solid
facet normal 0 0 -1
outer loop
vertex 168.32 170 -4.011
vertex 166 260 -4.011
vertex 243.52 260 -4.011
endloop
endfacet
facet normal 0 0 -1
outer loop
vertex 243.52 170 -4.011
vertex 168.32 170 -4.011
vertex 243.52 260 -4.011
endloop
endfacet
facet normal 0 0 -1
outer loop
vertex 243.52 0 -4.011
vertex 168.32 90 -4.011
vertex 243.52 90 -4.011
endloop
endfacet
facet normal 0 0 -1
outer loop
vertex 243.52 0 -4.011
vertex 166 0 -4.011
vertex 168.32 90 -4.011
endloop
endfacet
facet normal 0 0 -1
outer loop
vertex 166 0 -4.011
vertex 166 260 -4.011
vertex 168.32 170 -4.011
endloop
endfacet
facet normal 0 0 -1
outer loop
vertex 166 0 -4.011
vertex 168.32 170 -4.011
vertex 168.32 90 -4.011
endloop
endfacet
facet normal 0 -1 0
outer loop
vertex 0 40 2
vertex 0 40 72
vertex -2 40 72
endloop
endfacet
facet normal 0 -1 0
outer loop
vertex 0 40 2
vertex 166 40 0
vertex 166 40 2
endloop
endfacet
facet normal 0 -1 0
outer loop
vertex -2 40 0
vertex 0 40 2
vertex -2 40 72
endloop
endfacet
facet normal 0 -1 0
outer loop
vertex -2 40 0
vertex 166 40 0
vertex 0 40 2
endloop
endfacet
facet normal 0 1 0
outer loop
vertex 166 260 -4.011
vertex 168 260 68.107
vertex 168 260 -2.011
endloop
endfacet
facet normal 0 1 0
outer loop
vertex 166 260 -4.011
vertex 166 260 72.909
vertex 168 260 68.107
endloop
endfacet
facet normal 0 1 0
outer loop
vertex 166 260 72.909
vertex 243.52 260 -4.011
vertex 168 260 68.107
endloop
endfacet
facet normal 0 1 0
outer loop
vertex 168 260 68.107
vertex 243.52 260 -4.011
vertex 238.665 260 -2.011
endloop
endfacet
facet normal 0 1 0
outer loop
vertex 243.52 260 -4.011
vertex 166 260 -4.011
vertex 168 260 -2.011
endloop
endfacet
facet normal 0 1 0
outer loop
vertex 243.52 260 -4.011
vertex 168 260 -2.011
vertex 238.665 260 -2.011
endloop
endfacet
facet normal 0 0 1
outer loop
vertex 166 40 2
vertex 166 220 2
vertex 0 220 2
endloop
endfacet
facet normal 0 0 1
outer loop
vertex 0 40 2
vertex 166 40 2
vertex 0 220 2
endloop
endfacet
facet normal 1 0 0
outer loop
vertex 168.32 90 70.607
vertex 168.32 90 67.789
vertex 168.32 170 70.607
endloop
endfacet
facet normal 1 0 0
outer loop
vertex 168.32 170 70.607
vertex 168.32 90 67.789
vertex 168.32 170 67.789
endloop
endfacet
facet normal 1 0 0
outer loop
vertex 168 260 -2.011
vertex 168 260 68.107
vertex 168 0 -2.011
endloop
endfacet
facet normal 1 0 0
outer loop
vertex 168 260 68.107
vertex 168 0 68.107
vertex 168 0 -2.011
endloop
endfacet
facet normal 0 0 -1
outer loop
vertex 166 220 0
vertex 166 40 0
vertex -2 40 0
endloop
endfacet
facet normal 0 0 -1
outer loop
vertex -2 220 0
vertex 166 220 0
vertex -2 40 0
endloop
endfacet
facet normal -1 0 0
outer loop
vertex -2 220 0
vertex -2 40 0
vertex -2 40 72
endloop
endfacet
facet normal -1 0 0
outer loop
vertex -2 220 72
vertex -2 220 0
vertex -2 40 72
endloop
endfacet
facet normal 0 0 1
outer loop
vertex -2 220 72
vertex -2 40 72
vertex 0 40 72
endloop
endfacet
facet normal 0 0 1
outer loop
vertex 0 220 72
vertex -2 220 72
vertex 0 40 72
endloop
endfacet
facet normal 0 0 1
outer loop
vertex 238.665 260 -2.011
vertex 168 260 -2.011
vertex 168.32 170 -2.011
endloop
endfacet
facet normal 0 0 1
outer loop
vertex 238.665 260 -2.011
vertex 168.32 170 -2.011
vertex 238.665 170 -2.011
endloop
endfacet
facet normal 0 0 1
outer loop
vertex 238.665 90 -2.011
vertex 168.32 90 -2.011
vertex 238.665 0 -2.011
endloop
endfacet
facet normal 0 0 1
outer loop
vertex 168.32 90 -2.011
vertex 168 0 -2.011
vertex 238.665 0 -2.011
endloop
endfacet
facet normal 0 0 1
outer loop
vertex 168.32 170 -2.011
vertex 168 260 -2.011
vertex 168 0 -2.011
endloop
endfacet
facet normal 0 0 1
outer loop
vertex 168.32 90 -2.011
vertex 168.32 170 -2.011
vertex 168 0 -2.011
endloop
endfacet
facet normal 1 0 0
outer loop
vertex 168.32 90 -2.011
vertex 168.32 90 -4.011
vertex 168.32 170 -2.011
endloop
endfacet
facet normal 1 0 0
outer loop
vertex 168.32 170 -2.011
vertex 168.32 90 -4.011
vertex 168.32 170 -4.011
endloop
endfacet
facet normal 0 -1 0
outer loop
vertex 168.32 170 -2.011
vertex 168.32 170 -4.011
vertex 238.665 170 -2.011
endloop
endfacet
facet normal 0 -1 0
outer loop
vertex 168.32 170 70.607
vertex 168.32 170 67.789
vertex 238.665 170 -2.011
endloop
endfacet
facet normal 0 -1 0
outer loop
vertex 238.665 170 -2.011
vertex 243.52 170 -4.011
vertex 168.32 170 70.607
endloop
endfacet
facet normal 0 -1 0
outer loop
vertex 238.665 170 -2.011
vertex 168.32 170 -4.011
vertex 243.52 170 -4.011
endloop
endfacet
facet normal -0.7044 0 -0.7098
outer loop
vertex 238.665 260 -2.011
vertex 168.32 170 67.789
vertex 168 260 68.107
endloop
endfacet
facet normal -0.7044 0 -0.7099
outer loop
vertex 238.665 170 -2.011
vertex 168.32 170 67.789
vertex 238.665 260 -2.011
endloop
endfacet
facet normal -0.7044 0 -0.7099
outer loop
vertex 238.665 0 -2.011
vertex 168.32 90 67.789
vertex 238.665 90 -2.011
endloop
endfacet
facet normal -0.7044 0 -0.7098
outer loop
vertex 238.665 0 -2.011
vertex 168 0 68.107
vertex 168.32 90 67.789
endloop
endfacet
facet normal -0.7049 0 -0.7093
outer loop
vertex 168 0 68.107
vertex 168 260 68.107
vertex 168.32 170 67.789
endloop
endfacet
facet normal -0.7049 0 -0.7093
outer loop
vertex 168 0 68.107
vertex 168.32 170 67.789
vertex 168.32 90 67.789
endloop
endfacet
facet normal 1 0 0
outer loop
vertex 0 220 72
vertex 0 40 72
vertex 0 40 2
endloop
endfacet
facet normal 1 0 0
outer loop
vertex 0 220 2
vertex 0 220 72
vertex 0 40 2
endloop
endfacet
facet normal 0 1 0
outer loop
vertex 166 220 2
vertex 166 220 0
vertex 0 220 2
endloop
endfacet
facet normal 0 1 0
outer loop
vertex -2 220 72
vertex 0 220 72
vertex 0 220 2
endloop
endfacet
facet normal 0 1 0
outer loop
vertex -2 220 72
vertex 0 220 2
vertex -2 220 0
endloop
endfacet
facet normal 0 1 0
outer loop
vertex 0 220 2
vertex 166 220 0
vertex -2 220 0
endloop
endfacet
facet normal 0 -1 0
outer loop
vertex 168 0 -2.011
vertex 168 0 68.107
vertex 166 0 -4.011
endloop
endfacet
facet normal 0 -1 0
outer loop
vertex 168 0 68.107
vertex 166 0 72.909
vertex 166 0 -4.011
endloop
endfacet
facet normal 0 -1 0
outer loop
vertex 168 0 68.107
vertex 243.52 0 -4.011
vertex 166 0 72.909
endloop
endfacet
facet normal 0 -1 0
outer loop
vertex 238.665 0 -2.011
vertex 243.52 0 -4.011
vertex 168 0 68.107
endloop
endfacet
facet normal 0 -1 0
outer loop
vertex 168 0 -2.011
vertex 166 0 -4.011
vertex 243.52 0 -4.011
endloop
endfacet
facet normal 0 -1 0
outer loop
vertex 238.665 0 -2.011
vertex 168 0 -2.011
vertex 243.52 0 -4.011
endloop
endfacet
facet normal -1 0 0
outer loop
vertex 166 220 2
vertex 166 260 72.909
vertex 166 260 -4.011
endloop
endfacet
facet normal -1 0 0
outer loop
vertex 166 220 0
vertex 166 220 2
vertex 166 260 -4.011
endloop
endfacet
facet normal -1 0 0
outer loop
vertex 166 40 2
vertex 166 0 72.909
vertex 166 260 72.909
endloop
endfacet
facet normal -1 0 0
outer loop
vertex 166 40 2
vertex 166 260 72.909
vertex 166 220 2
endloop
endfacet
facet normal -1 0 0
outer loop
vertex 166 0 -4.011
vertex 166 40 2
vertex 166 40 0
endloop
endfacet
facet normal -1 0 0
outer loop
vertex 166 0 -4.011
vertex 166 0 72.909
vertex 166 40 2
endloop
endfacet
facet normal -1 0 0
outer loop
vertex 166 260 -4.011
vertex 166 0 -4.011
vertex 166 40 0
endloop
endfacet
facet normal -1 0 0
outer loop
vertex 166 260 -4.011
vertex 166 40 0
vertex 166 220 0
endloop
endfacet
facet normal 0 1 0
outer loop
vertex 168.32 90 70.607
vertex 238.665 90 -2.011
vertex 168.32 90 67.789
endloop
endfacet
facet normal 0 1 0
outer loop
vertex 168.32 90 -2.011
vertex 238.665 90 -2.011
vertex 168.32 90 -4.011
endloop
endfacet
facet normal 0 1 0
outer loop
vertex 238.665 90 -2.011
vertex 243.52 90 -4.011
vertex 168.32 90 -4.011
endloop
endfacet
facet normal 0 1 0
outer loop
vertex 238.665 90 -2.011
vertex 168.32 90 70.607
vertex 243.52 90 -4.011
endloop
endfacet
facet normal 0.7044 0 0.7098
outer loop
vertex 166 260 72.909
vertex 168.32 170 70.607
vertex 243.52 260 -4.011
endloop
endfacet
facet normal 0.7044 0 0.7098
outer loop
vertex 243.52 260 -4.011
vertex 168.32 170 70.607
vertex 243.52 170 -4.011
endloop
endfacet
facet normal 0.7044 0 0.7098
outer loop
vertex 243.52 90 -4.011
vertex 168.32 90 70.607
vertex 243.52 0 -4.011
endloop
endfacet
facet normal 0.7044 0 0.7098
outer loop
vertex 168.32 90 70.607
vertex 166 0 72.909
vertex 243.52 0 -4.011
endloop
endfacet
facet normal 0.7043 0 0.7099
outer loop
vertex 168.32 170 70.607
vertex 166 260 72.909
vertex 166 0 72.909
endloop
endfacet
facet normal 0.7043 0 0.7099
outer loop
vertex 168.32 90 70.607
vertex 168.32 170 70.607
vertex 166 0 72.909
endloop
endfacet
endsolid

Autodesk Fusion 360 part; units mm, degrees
sketch "Sketch1" plane through (0, 0, 0) normal (0, 1, 0) x (1, 0, 0)
  line L0 (0, 0) -> (-2, 0)
  line L1 (-2, 0) -> (-2, -72)
  line L2 (-2, -72) -> (0, -72)
  line L3 (0, -72) -> (0, 0)
  line L4 (0, 0) -> (166, 0)
  line L5 (166, 0) -> (166, -2)
  line L6 (166, -2) -> (0, -2)
  line L7 (0, -2) -> (0, 0)
  line L8 (166, -72.909) -> (166, 4.011)
  line L9 (166, -72.909) -> (243.52, 4.011)
  line L10 (166, 4.011) -> (243.52, 4.011)
  line L11 (168, -68.107) -> (238.6649, 2.011)
  line L12 (168, 2.011) -> (238.6649, 2.011)
  line L13 (168, -68.107) -> (168, 2.011)
  dimension "d1" = 2
  dimension "d2" = 72
  dimension "d3" = 166
  dimension "d4" = 2
  dimension "d5" = 76.92
  dimension "d6" = 4.011
  dimension "d8" = 77.52
  dimension "d9" = 2
extrude "Extrude1" add sketch "Sketch1" along normal blind 260
sketch "Sketch2" plane through (0, 0, 2) normal (0, 0, 1) x (-1, 0, 0)
  line L0 (0, 0) -> (-166, 0)
  line L1 (-166, 0) -> (-166, -260)
  line L2 (-166, -260) -> (0, -260)
  line L3 (0, -260) -> (0, 0)
  line L4 (2, 0) -> (-166, 0)
  line L5 (-166, 0) -> (-166, -40)
  line L6 (-166, -40) -> (2, -40)
  line L7 (2, -40) -> (2, 0)
  line L8 (0, -130) -> (-166, -130) construction
  line L9 (2, -220) -> (2, -260)
  line L10 (-166, -220) -> (2, -220)
  line L11 (2, -260) -> (-166, -260)
  line L12 (-166, -260) -> (-166, -220)
  point P0 (2, 0)
  dimension "d12" = 168
  dimension "d13" = 40
extrude "Extrude2" cut sketch "Sketch2" against normal blind 45 contours L0 L1 L3 L4 L5 L6 | L3 L4 L6 L7 | L3 L9 L10 L11 | L1 L2 L3 L10 L11 L12
extrude "Extrude3" cut sketch "Sketch2" along normal blind 80 contours L3 L4 L6 L7 | L3 L9 L10 L11
sketch "Sketch3" plane through (0, 0, 2) normal (0, 0, 1) x (-1, 0, 0)
  line L0 (-166, -220) -> (0, -220)
  line L1 (0, -220) -> (0, -40)
  line L2 (0, -40) -> (-166, -40)
  line L3 (-166, -40) -> (-166, -220)
  line L4 (-168.32, -170) -> (-243.52, -170)
  line L5 (-243.52, -170) -> (-243.52, -90)
  line L6 (-243.52, -90) -> (-168.32, -90)
  line L7 (-168.32, -90) -> (-168.32, -170)
  line L8 (-243.52, 0) -> (-243.52, -260)
  dimension "d18" = 75.2
  dimension "d19" = 80
extrude "Extrude4" cut sketch "Sketch3" along normal mid plane 260 contours L4 L5 L6 L7 L8
equation "d2 = ( 7.2 * 10 ) * 1 mm"
equation "d3 = ( 16.6 * 10 ) * 1 mm"
